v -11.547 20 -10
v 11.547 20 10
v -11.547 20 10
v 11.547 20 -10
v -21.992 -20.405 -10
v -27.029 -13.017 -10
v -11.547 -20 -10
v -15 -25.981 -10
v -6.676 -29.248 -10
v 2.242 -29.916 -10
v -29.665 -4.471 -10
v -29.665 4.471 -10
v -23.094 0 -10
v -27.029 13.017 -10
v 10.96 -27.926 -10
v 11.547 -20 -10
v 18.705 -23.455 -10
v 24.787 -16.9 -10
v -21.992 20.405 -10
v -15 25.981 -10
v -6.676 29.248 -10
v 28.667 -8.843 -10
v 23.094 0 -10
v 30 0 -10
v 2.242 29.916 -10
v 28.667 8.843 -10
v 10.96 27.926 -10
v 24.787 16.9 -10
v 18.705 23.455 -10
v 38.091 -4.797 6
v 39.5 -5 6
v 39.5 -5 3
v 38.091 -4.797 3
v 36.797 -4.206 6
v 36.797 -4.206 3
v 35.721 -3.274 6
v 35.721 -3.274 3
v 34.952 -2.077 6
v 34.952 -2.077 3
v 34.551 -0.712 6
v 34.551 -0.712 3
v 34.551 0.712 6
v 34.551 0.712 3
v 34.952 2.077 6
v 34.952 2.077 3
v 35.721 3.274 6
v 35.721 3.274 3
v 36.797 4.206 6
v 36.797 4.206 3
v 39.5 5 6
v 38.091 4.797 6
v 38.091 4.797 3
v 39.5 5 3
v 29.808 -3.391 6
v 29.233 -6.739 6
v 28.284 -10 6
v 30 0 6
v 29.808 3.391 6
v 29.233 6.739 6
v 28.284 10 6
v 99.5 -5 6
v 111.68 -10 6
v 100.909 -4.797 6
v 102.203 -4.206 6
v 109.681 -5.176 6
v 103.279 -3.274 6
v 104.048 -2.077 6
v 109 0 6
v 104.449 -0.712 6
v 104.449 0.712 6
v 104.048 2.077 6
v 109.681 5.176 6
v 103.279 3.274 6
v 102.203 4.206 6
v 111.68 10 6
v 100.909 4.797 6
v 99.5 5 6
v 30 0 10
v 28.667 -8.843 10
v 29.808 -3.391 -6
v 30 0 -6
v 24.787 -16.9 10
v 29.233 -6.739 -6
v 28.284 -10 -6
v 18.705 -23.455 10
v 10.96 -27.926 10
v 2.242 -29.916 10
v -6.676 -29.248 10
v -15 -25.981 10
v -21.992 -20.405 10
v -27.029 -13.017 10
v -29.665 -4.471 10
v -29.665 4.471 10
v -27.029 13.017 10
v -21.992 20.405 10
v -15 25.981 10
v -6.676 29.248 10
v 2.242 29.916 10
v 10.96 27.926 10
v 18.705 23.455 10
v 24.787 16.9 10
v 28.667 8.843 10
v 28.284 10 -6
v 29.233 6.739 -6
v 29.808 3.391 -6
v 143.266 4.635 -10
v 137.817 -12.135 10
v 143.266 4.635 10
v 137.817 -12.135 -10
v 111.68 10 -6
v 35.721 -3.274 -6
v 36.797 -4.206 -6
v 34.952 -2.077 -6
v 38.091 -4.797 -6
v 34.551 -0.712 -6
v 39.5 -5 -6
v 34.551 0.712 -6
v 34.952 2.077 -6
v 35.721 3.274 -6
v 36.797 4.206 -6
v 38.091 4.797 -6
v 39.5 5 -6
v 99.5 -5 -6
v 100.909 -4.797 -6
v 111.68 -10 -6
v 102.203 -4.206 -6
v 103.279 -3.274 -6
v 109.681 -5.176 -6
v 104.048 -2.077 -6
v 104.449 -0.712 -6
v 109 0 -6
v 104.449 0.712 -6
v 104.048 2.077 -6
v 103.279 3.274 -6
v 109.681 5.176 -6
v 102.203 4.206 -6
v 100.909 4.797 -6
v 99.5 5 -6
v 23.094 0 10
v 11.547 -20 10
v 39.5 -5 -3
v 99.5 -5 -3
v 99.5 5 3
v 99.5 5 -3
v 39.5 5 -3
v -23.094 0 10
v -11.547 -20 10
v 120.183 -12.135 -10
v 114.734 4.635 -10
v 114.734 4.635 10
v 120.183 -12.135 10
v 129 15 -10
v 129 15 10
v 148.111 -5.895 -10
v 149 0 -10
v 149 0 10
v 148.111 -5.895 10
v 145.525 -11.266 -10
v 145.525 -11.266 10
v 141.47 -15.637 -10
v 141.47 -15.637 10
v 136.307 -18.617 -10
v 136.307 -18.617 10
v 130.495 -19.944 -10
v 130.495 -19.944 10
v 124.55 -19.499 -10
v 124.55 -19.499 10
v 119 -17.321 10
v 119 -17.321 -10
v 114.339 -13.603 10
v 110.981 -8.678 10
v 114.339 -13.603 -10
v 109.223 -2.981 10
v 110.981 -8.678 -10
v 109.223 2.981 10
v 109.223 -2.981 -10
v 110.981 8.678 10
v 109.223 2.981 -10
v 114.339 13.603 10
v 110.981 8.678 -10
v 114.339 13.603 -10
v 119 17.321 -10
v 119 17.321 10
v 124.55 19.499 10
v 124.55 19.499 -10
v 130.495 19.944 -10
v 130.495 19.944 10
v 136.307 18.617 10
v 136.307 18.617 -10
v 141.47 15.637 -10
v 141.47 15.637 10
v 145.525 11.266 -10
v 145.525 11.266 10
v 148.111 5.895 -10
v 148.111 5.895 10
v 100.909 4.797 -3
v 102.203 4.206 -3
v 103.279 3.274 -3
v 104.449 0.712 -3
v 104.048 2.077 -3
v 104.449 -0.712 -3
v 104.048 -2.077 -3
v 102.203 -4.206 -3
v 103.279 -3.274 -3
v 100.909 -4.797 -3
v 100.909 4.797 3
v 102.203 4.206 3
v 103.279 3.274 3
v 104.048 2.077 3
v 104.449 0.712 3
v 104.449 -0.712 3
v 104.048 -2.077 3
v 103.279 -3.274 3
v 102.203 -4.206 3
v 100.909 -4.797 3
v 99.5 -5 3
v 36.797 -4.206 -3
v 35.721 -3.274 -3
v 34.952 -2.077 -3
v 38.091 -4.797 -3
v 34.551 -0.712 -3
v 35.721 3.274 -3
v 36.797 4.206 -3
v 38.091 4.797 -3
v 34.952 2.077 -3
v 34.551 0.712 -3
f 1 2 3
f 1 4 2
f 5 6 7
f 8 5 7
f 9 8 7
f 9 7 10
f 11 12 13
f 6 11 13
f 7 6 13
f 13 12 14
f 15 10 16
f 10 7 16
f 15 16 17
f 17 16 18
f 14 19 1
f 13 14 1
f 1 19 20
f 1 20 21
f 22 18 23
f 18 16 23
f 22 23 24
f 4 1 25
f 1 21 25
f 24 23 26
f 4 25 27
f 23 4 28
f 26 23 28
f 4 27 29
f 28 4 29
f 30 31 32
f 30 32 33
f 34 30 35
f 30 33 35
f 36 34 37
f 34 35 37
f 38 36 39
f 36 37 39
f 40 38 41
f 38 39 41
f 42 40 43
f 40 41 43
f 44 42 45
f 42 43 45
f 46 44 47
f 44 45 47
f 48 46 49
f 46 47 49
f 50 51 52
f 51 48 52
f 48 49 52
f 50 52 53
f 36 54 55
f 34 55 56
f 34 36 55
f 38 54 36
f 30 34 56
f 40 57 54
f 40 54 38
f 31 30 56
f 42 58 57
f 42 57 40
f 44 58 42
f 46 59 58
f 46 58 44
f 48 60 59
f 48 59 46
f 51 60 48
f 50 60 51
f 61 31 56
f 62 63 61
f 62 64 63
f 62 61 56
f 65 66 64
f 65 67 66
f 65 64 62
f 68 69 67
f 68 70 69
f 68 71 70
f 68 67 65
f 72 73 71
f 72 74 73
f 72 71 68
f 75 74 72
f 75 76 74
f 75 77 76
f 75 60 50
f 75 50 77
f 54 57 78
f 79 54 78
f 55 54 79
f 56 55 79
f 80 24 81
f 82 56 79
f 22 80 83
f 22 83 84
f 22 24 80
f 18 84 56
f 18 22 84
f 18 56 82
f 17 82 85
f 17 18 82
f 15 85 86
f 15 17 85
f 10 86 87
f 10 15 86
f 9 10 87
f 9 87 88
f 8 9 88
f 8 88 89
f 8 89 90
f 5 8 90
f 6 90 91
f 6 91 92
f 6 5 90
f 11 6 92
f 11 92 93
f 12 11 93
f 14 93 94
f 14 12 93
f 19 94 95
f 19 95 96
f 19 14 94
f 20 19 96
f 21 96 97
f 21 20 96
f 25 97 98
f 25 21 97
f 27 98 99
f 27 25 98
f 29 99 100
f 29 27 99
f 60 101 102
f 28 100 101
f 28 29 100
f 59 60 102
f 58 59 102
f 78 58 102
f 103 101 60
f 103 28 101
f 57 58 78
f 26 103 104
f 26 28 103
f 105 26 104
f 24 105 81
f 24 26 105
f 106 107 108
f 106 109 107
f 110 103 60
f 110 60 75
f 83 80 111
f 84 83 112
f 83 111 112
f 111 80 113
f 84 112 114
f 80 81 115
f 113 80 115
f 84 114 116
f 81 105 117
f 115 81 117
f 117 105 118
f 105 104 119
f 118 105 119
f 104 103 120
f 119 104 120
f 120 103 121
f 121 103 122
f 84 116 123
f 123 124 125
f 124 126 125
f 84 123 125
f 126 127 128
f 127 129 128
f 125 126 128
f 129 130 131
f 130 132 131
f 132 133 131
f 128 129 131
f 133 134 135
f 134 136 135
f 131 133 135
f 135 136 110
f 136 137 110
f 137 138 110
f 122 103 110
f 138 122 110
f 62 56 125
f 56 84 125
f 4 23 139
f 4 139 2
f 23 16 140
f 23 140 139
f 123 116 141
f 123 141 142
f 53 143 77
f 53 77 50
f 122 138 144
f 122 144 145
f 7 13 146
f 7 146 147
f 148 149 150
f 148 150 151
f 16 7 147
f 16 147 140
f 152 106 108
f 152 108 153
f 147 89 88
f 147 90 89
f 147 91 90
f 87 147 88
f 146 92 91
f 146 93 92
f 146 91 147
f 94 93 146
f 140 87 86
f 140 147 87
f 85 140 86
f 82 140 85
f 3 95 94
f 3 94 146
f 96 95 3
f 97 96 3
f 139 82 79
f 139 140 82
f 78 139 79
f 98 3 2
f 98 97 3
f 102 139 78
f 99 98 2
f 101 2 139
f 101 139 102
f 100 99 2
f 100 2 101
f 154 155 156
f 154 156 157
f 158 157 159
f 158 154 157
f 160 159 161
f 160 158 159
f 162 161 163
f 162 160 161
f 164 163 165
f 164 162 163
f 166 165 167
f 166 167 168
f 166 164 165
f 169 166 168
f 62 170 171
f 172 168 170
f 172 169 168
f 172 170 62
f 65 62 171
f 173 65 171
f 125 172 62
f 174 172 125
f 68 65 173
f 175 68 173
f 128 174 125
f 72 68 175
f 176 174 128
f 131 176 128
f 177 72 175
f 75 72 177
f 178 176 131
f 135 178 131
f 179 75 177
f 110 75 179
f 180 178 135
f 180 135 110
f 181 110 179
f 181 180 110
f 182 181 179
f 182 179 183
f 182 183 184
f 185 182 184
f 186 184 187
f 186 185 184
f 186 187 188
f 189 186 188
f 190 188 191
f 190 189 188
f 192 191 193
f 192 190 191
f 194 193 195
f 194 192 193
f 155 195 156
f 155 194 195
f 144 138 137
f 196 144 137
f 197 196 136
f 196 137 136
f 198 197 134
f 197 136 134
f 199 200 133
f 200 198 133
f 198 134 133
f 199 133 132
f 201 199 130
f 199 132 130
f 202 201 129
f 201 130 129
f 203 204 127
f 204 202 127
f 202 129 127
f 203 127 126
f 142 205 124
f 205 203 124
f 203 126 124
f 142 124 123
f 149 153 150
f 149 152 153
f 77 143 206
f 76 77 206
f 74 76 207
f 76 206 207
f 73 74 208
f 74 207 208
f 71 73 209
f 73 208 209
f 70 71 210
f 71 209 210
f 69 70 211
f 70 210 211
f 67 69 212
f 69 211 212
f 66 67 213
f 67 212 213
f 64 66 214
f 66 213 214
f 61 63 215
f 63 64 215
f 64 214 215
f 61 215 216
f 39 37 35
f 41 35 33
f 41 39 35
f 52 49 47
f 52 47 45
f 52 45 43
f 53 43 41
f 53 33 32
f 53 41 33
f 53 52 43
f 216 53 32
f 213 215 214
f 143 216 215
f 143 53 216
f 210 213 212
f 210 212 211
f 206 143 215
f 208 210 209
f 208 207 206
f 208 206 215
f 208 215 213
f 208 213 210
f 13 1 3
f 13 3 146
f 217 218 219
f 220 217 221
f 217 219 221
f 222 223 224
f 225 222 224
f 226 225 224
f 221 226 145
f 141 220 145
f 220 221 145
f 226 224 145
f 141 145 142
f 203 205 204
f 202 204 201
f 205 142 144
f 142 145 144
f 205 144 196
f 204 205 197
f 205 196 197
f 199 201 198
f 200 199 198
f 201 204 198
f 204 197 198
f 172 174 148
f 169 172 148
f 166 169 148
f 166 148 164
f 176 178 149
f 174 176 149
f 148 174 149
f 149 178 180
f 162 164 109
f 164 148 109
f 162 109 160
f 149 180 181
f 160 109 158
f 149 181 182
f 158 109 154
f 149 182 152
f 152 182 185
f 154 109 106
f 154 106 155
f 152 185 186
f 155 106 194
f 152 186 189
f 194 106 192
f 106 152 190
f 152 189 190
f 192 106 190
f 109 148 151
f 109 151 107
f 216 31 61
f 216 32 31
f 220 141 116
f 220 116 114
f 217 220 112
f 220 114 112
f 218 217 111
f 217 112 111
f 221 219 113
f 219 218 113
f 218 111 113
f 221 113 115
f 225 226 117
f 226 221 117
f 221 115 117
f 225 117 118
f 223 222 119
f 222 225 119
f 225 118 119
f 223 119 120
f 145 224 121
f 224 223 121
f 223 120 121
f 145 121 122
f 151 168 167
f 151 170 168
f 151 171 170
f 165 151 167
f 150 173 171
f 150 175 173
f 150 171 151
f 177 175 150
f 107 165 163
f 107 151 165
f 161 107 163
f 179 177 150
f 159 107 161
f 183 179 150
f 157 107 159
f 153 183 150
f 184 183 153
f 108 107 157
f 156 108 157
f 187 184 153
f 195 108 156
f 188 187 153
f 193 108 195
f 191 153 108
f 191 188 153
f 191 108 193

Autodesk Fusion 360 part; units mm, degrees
sketch "Sketch1" plane through (0, 0, 0) normal (0, 0, 1) x (1, 0, 0) in component "Exercise 2"
  circle A0 centre (0, 0) radius 30
  line L0 (30, 0) -> (109, 0) construction
  circle A1 centre (129, 0) radius 20
  line L1 (-23.094, 0) -> (-11.547, -20)
  line L2 (-11.547, -20) -> (11.547, -20)
  line L3 (11.547, -20) -> (23.094, 0)
  line L4 (23.094, 0) -> (11.547, 20)
  line L5 (11.547, 20) -> (-11.547, 20)
  line L6 (-11.547, 20) -> (-23.094, 0)
  line L7 (129, 15) -> (114.7342, 4.6353)
  line L8 (114.7342, 4.6353) -> (120.1832, -12.1353)
  line L9 (120.1832, -12.1353) -> (137.8168, -12.1353)
  line L10 (137.8168, -12.1353) -> (143.2658, 4.6353)
  line L11 (143.2658, 4.6353) -> (129, 15)
  line L12 (28.2843, 10) -> (111.6795, 10)
  line L13 (28.2843, -10) -> (111.6795, -10)
  line L14 (41.522, 10) -> (41.522, -10) construction
  line L15 (41.522, 0) -> (50, 0) construction
  line L16 (69.5, 0) -> (69.5, 26.8283) construction
  line L17 (99.5, 5) -> (39.5, 5)
  line L18 (39.5, -5) -> (99.5, -5)
  line L19 (99.5, 5) -> (39.5, -5) construction
  line L20 (39.5, 5) -> (99.5, -5) construction
  arc A2 (41.522, 4.5729) -> (41.522, -4.5729) centre (39.5, 0) ccw
  arc A3 (97.8784, -4.7297) -> (97.8784, 4.7297) centre (99.5, 0) ccw
  point P0 (129, 0)
  point P1 (69.5, 0)
  dimension "d13" = 60
  dimension "d14" = 129
  dimension "d15" = 40
  dimension "d17" = 20
  dimension "d18" = 15
  dimension "d19" = 20
  dimension "d20" = 60
  dimension "d21" = 10
  dimension "d22" = 10
extrude "Extrude1" add sketch "Sketch1" along normal mid plane 20 contours A0 | A1 makes body 1 at (27.1662, -12.7278, 3.3333) makes body 2 at (148.9006, -1.9914, -3.3333) in component "Exercise 2"
extrude "Extrude2" add sketch "Sketch1" along normal mid plane 12 contours A0 A1 L12 L13 bodies 1 2 in component "Exercise 2"
extrude "Extrude3" add sketch "Sketch1" along normal mid plane 6 contours L17 L18 A2 A3 bodies 1 in component "Exercise 2"
component "Exercise 2" placed x (1, 0, 0) y (0, 1, 0) z (0, 0, 1) at (0, 0, 0)
